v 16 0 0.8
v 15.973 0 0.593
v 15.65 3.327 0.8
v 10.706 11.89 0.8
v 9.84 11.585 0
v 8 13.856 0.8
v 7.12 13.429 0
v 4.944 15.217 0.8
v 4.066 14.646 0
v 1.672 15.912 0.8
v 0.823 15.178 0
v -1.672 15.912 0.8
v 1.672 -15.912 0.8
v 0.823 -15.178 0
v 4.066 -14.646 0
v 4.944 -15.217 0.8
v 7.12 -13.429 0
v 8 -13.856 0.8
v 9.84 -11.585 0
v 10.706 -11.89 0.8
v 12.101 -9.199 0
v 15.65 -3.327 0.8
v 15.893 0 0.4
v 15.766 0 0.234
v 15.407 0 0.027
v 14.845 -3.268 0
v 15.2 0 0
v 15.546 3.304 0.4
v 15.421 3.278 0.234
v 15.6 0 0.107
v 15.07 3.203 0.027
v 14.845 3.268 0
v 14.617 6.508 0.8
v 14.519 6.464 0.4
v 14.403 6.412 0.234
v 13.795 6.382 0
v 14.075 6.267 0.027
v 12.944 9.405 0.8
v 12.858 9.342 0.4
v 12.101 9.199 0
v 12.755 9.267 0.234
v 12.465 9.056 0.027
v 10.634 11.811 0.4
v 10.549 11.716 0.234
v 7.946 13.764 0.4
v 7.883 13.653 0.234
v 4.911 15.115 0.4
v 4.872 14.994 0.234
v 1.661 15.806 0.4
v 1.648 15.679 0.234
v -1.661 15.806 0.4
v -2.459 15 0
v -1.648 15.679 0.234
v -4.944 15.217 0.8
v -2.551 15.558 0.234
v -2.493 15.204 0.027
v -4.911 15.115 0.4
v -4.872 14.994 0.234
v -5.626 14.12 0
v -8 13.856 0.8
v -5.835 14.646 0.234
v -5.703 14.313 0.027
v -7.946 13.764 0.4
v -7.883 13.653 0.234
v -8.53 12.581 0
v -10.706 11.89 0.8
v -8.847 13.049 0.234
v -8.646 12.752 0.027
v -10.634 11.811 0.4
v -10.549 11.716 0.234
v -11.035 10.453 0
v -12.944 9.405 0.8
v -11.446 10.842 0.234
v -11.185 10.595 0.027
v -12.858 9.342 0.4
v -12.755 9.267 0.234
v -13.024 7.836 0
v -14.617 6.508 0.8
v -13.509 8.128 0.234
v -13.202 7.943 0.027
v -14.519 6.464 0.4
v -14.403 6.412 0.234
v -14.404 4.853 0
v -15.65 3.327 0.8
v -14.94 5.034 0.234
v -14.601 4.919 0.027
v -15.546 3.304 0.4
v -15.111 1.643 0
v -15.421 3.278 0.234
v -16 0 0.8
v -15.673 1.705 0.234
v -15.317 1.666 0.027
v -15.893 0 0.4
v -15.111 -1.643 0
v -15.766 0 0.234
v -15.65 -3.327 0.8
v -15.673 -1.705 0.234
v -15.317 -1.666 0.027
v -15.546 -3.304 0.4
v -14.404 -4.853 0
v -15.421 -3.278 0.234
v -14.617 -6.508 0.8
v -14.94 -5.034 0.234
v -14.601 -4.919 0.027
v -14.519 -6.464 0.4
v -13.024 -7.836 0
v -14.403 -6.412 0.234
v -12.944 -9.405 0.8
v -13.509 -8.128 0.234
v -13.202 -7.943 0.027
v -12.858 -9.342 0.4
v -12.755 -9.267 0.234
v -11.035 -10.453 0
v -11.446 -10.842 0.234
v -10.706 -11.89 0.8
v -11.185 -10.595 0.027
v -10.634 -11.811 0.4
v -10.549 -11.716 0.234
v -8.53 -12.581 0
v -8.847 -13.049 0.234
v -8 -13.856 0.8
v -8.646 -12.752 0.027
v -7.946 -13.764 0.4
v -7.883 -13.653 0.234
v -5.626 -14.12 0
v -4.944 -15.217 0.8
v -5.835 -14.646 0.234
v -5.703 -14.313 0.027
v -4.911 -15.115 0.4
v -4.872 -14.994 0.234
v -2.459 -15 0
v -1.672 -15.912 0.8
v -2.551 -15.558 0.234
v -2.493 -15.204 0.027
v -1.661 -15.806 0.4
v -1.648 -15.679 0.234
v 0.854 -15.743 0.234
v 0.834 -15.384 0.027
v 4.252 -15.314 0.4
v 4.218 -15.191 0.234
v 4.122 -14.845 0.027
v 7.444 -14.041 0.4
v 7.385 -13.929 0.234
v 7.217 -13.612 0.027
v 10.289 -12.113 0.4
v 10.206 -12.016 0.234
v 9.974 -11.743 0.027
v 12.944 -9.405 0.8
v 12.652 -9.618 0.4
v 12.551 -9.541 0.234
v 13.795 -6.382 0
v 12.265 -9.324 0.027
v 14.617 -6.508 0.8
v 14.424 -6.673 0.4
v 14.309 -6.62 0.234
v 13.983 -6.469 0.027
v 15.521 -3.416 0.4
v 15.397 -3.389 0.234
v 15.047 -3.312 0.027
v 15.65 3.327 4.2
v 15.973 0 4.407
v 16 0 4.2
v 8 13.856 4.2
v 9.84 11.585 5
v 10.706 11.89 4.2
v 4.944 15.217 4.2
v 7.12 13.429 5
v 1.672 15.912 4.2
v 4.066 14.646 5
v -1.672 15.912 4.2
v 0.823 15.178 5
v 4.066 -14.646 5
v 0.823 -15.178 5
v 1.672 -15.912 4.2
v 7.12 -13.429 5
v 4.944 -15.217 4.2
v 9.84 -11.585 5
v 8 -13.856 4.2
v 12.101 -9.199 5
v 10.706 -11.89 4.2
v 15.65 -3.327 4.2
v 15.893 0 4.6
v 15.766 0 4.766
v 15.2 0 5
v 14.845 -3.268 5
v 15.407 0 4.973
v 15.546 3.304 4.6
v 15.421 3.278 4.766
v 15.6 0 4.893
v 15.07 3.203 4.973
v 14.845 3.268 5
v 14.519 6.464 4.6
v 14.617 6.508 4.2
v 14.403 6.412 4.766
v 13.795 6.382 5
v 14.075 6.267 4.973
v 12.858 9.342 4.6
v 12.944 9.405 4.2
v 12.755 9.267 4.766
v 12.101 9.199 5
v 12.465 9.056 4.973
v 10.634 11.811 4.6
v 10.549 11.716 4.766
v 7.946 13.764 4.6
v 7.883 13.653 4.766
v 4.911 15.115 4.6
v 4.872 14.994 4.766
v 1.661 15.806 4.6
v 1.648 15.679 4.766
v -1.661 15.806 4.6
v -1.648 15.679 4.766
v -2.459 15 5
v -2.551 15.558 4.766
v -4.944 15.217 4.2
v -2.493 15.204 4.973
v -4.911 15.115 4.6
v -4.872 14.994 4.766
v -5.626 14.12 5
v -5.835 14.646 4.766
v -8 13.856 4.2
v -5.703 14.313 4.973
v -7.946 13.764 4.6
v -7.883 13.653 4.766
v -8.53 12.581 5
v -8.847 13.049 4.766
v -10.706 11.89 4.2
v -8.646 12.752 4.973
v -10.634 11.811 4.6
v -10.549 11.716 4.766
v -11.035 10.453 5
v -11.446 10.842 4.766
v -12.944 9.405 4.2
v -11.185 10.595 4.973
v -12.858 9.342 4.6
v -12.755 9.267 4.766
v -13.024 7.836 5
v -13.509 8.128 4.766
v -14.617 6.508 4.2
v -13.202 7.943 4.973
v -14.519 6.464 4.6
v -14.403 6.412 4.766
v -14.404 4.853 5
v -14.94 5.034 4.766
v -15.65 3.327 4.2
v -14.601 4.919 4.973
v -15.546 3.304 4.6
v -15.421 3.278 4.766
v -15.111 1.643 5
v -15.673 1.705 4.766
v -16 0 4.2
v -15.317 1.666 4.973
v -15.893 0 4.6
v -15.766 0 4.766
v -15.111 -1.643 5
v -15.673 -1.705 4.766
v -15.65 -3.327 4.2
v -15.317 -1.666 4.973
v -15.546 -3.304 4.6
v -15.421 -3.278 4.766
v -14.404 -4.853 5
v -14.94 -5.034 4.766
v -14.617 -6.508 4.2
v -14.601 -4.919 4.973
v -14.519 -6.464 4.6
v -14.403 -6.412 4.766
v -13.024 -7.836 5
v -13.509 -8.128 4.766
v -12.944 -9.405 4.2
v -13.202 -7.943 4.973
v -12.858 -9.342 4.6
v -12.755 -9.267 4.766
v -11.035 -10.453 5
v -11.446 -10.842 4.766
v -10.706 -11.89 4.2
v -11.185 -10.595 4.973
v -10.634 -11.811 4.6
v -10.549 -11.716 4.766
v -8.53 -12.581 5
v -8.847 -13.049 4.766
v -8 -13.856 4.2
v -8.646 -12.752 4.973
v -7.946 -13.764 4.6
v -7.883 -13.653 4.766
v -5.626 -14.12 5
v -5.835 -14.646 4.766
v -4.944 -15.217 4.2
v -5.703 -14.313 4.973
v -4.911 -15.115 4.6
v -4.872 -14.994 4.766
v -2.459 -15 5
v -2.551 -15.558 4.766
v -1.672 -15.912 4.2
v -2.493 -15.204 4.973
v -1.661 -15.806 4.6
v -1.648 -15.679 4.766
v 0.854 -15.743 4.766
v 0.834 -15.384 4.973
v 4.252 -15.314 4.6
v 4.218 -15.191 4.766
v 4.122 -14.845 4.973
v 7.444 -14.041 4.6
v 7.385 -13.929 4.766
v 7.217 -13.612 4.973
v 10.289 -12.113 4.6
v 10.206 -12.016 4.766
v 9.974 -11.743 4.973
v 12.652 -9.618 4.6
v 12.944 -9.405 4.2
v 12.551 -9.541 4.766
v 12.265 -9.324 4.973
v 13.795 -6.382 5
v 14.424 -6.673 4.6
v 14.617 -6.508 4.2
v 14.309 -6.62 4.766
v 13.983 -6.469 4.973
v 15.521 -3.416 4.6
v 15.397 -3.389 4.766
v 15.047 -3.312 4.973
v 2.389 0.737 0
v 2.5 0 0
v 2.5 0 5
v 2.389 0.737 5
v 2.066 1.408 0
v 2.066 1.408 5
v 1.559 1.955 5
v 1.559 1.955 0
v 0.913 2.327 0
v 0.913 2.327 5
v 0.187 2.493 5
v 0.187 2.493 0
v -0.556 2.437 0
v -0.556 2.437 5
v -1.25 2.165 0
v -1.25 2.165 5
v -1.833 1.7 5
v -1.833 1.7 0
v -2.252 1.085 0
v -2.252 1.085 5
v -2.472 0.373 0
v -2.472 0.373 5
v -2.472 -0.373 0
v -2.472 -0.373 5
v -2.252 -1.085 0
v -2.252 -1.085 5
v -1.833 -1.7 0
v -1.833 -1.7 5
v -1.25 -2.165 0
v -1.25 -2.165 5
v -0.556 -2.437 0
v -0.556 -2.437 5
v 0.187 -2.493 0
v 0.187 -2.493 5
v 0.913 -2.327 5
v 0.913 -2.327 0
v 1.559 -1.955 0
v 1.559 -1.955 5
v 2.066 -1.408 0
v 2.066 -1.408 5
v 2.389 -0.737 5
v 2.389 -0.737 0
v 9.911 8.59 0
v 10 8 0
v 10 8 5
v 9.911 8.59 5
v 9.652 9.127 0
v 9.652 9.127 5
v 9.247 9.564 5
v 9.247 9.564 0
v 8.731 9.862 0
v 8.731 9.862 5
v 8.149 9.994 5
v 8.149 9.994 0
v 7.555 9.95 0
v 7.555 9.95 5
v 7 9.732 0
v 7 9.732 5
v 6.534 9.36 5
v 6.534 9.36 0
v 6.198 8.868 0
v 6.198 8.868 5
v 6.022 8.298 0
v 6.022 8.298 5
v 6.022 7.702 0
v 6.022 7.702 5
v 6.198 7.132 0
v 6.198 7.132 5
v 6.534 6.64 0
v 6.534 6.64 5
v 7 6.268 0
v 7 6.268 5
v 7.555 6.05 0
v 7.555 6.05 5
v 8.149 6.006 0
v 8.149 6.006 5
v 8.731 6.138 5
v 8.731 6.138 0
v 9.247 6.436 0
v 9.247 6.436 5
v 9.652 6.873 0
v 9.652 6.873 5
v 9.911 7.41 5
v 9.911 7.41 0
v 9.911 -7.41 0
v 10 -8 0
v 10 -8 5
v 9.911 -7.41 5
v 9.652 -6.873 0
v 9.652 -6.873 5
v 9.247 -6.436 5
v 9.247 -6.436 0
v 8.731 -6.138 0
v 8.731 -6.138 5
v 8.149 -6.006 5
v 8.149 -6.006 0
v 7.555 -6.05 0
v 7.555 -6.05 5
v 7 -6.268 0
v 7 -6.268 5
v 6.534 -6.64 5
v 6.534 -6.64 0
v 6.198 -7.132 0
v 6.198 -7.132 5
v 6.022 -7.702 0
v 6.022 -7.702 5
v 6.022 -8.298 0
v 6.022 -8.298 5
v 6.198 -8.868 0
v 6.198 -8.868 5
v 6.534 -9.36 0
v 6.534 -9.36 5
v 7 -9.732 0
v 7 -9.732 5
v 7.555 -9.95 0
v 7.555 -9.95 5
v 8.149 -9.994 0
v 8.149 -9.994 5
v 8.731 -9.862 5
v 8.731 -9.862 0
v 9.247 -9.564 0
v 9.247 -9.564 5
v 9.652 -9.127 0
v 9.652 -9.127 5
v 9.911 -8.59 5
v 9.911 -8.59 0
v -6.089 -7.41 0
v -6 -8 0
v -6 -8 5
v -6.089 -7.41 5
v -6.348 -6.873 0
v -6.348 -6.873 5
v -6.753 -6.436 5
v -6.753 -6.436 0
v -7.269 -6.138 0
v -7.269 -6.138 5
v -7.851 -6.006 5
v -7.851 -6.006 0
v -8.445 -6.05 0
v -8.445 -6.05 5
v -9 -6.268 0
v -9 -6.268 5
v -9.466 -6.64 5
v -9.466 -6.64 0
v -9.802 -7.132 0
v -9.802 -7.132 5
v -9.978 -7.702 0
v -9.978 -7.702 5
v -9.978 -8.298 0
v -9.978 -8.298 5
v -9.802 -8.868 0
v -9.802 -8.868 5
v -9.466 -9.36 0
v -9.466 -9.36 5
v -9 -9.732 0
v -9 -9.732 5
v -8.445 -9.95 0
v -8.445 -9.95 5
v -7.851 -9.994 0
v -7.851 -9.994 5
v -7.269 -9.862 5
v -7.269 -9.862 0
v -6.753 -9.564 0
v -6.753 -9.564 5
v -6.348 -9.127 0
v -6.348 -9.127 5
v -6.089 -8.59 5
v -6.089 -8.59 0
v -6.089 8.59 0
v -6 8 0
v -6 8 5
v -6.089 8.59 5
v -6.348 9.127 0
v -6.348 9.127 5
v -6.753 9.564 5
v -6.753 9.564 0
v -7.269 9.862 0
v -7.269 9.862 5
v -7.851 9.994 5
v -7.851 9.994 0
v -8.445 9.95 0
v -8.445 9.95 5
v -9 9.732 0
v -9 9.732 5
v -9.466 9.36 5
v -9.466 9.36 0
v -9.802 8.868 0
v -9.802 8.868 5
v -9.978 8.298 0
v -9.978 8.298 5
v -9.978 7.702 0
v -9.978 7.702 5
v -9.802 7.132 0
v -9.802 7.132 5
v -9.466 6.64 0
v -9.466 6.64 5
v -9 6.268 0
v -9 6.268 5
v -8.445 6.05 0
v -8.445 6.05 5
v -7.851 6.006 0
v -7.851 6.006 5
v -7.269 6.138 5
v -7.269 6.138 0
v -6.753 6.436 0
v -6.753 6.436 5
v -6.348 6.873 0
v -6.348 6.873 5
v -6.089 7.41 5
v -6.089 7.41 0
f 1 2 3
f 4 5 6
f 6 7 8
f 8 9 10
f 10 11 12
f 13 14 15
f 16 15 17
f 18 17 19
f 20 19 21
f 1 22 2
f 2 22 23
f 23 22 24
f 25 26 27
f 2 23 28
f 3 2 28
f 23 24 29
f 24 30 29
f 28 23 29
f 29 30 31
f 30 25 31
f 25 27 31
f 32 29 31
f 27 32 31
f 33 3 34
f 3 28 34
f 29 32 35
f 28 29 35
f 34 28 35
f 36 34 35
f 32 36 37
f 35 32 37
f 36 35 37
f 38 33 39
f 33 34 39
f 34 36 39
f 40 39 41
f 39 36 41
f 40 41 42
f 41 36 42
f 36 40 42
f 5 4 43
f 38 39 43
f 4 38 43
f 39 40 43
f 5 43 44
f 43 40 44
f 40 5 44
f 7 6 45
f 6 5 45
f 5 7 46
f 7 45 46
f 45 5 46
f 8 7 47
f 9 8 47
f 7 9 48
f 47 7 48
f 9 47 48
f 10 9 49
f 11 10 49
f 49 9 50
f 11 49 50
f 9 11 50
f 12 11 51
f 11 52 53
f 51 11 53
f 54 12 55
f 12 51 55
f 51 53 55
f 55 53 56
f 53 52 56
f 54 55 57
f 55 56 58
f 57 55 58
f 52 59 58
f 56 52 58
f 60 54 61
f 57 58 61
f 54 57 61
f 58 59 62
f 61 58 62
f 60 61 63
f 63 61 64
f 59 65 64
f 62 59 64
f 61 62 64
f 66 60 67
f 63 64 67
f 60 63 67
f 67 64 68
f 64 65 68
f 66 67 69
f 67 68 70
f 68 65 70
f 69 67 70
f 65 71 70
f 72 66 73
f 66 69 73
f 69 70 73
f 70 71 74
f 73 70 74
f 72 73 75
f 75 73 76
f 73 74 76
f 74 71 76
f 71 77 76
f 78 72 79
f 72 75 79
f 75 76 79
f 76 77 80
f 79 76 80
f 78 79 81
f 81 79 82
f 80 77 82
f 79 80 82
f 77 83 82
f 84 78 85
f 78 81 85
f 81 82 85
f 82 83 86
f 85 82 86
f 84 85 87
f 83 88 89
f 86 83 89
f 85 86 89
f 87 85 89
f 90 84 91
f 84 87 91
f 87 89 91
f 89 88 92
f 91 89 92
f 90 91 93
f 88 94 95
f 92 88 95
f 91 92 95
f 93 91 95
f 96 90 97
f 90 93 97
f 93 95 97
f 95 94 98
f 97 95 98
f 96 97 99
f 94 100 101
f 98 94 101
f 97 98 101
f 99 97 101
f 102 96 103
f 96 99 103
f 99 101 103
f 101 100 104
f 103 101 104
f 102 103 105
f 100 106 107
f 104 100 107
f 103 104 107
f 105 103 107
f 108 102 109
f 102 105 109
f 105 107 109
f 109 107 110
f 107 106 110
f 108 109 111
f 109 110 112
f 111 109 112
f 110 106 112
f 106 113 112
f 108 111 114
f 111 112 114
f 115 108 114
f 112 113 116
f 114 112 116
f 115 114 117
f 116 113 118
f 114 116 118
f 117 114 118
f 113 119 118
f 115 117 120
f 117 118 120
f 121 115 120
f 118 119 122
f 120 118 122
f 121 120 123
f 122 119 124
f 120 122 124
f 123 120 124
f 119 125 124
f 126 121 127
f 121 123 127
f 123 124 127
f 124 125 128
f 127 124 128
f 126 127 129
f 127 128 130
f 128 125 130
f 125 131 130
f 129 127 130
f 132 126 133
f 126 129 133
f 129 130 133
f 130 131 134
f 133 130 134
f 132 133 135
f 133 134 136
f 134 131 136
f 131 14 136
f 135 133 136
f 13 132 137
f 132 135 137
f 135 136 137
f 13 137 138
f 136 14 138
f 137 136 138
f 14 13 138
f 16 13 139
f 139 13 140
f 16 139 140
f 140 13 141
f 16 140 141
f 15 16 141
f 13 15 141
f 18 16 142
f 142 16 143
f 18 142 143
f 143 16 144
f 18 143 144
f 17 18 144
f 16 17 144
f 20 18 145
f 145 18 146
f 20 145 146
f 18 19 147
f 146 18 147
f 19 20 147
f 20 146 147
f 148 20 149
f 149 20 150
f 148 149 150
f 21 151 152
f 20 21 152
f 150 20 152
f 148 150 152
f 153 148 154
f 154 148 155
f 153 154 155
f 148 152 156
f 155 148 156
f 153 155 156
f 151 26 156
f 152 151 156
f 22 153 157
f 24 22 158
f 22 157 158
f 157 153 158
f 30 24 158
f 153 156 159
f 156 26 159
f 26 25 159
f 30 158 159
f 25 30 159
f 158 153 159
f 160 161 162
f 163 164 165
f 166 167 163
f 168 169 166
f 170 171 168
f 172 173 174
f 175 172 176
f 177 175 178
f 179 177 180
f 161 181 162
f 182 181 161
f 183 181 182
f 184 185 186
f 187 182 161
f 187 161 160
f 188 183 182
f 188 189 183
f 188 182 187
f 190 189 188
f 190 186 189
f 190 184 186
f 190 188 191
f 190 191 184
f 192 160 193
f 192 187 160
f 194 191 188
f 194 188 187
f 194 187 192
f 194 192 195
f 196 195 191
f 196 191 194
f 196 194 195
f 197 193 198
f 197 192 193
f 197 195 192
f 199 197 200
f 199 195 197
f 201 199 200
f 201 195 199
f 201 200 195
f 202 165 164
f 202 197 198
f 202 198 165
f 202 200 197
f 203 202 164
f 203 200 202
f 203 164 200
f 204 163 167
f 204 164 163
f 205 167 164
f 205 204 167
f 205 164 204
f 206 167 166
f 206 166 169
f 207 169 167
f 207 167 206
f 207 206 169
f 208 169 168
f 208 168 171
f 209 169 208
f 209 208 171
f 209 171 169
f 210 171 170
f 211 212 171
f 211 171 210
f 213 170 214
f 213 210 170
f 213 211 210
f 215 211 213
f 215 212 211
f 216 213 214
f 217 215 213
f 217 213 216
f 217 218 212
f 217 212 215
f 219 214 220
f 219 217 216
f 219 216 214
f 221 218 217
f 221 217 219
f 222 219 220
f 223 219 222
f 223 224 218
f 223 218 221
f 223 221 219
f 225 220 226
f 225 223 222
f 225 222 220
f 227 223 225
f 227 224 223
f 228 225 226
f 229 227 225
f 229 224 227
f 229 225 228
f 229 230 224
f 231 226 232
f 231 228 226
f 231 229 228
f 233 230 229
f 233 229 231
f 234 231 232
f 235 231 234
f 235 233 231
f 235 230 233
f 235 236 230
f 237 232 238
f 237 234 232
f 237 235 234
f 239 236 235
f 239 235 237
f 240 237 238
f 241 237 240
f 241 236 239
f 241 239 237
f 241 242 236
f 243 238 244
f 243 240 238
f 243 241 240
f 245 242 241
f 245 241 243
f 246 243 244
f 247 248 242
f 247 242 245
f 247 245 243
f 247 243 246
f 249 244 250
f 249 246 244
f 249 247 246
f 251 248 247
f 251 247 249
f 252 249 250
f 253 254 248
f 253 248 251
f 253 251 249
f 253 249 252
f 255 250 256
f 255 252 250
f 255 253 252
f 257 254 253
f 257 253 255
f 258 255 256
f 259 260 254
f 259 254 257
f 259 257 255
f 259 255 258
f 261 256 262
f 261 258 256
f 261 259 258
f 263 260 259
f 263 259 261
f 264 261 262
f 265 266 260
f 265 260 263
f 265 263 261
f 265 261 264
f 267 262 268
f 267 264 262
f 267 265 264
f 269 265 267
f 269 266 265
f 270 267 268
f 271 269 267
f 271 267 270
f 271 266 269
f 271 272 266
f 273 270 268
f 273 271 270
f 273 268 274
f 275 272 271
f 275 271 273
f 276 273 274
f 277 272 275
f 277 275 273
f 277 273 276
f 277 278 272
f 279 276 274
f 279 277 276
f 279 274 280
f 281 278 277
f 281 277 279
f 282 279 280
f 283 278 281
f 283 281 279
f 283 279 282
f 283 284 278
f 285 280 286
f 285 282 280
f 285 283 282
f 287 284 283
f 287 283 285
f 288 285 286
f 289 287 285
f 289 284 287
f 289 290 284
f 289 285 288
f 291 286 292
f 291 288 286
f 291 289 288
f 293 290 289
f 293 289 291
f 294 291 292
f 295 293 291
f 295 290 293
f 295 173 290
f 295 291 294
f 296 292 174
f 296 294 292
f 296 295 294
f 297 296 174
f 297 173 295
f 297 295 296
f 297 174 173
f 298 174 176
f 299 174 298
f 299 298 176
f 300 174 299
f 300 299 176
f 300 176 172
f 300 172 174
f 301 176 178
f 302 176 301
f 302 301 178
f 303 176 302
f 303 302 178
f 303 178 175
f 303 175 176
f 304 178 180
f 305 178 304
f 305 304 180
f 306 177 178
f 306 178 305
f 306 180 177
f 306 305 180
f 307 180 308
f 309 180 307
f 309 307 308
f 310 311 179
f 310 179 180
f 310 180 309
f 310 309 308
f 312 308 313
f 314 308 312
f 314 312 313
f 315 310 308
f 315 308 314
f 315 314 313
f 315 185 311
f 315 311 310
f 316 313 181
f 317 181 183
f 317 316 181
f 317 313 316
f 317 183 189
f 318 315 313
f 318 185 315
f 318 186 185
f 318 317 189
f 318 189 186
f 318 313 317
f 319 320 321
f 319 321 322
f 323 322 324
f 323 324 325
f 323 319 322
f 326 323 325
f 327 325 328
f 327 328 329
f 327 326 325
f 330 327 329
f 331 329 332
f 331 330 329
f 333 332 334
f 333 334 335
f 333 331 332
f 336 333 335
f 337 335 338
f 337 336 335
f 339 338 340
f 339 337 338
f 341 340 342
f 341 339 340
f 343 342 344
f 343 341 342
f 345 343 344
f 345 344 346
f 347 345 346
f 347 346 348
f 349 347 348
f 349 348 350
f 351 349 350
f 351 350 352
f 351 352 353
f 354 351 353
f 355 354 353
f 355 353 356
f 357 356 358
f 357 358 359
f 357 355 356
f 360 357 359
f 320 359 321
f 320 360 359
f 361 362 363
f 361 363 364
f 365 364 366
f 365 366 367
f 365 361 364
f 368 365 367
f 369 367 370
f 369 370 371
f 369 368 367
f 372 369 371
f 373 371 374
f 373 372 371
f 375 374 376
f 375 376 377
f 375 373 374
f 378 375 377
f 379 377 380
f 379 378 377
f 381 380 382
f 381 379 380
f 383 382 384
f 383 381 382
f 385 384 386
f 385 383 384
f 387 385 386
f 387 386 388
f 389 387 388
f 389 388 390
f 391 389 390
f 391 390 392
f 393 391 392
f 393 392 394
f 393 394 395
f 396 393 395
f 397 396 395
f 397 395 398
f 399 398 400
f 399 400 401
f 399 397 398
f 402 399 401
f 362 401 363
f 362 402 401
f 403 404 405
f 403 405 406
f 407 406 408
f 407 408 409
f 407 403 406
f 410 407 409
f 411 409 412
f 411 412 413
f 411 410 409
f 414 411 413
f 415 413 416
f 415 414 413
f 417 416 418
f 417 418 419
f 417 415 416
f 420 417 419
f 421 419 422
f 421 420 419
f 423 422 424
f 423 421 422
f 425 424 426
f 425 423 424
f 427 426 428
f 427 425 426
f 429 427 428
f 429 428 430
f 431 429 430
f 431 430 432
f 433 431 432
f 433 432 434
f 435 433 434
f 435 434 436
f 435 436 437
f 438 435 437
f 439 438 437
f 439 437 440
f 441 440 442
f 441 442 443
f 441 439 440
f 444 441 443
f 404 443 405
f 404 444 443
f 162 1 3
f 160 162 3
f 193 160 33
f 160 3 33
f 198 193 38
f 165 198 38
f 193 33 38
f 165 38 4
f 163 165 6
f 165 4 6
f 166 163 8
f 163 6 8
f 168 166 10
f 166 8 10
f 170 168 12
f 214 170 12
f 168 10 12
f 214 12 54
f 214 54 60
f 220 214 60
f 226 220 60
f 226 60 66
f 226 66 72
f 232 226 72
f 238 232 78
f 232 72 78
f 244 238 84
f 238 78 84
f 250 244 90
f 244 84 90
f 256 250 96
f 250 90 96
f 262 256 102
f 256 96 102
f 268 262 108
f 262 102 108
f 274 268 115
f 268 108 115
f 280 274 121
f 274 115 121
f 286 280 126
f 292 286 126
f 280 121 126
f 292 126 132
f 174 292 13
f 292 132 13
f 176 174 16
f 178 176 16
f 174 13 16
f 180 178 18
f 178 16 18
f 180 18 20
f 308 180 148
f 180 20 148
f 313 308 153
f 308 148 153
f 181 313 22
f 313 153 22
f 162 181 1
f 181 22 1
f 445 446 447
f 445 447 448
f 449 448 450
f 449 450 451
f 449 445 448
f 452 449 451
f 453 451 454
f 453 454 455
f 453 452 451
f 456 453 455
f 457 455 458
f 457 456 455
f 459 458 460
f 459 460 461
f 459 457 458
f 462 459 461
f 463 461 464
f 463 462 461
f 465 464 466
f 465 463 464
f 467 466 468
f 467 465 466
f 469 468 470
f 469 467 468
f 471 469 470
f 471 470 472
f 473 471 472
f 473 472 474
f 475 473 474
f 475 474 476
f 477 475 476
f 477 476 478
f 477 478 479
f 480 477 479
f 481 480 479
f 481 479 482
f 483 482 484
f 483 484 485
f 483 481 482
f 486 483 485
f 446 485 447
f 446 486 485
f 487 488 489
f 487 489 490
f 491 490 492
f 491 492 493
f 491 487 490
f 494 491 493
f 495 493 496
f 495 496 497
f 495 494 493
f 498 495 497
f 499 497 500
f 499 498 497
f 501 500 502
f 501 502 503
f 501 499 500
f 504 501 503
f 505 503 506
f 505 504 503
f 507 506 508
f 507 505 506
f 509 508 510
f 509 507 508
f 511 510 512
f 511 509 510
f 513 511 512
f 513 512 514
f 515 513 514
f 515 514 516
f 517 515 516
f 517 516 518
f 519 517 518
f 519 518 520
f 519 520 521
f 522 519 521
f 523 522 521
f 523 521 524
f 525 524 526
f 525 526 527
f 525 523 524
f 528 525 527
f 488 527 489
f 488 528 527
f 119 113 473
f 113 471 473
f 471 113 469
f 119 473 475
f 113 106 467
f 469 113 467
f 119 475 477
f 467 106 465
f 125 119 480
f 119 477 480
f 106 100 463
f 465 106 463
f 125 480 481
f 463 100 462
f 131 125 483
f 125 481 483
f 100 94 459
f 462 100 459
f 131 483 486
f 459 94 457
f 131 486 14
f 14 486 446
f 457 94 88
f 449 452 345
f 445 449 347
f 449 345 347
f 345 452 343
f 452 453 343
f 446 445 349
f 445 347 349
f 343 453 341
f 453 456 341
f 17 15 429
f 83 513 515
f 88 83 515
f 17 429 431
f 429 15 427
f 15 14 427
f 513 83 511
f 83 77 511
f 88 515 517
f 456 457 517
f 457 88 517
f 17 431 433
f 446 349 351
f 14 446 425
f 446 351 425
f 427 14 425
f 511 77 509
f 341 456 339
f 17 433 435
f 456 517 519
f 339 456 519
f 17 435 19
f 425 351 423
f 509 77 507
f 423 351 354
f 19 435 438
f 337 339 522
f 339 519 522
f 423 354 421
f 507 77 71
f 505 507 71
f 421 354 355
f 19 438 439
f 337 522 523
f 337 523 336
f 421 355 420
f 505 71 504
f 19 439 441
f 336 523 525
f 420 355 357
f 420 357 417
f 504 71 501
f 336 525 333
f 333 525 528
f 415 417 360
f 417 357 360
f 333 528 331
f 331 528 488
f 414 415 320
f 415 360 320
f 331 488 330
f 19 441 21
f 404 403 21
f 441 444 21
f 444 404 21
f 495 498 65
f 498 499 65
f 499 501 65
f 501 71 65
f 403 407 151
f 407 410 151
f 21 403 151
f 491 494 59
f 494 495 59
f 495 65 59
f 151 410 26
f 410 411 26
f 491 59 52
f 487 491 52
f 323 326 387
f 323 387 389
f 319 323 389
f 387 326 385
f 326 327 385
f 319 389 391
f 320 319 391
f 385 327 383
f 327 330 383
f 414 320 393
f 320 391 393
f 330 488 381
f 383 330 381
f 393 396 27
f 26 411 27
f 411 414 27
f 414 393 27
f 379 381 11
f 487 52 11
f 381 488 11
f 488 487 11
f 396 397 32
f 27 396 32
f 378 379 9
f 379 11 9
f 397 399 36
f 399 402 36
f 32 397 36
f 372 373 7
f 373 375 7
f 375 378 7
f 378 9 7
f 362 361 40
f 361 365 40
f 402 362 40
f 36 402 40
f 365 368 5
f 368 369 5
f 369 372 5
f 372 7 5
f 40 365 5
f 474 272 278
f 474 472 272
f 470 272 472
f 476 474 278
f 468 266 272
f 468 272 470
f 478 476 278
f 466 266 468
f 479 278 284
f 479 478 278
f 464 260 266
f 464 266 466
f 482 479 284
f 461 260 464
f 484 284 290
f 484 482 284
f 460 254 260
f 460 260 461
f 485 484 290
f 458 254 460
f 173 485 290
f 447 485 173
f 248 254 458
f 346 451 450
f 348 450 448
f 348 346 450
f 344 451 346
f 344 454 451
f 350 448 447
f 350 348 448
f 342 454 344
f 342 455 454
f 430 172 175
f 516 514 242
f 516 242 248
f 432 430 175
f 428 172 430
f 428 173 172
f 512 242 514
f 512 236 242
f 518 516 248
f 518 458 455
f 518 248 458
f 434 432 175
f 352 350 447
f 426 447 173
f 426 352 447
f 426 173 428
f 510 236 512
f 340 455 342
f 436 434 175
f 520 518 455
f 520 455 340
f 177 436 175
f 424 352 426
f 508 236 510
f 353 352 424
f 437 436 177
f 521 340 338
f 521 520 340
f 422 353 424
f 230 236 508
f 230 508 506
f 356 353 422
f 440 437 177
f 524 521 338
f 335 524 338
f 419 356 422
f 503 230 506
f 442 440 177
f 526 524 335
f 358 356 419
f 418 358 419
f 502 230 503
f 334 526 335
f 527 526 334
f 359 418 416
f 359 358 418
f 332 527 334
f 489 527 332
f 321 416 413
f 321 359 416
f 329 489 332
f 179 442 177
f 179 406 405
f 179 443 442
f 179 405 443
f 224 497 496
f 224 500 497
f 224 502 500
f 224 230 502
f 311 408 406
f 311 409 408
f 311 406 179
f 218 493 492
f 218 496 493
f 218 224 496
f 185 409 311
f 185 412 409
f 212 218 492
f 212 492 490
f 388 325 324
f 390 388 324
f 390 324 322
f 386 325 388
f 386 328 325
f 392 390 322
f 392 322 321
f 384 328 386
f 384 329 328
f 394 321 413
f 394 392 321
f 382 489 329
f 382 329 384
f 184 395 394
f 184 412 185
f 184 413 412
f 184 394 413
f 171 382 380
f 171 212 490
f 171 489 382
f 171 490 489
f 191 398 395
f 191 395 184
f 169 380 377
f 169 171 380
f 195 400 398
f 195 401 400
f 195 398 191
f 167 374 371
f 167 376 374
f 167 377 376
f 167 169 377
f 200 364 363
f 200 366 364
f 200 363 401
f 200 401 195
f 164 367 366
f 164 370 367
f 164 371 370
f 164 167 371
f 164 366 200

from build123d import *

# Parameters (mm, degrees)
SKETCH1_R      = 16
SKETCH1_R_2    = 2
SKETCH1_R_3    = 2.5
EXTRUDE2_DEPTH = 5
FILLET1_R      = 0.8


with BuildPart() as part:
    # Sketch1 → Extrude2 (new body)
    with BuildSketch(Plane.XY):
        Circle(SKETCH1_R)
        with Locations((-8, 8)):
            Circle(SKETCH1_R_2, mode=Mode.SUBTRACT)
        with Locations((-8, -8)):
            Circle(SKETCH1_R_2, mode=Mode.SUBTRACT)
        with Locations((8, -8)):
            Circle(SKETCH1_R_2, mode=Mode.SUBTRACT)
        with Locations((8, 8)):
            Circle(SKETCH1_R_2, mode=Mode.SUBTRACT)
        Circle(SKETCH1_R_3, mode=Mode.SUBTRACT)
    extrude(amount=EXTRUDE2_DEPTH)

    # Fillet1
    fillet1_edges = [part.edges().sort_by_distance(p)[0] for p in [
        (-16, 0, 5),
        (-16, 0, 0),
    ]]
    fillet(fillet1_edges, radius=FILLET1_R)


solid = part.part
